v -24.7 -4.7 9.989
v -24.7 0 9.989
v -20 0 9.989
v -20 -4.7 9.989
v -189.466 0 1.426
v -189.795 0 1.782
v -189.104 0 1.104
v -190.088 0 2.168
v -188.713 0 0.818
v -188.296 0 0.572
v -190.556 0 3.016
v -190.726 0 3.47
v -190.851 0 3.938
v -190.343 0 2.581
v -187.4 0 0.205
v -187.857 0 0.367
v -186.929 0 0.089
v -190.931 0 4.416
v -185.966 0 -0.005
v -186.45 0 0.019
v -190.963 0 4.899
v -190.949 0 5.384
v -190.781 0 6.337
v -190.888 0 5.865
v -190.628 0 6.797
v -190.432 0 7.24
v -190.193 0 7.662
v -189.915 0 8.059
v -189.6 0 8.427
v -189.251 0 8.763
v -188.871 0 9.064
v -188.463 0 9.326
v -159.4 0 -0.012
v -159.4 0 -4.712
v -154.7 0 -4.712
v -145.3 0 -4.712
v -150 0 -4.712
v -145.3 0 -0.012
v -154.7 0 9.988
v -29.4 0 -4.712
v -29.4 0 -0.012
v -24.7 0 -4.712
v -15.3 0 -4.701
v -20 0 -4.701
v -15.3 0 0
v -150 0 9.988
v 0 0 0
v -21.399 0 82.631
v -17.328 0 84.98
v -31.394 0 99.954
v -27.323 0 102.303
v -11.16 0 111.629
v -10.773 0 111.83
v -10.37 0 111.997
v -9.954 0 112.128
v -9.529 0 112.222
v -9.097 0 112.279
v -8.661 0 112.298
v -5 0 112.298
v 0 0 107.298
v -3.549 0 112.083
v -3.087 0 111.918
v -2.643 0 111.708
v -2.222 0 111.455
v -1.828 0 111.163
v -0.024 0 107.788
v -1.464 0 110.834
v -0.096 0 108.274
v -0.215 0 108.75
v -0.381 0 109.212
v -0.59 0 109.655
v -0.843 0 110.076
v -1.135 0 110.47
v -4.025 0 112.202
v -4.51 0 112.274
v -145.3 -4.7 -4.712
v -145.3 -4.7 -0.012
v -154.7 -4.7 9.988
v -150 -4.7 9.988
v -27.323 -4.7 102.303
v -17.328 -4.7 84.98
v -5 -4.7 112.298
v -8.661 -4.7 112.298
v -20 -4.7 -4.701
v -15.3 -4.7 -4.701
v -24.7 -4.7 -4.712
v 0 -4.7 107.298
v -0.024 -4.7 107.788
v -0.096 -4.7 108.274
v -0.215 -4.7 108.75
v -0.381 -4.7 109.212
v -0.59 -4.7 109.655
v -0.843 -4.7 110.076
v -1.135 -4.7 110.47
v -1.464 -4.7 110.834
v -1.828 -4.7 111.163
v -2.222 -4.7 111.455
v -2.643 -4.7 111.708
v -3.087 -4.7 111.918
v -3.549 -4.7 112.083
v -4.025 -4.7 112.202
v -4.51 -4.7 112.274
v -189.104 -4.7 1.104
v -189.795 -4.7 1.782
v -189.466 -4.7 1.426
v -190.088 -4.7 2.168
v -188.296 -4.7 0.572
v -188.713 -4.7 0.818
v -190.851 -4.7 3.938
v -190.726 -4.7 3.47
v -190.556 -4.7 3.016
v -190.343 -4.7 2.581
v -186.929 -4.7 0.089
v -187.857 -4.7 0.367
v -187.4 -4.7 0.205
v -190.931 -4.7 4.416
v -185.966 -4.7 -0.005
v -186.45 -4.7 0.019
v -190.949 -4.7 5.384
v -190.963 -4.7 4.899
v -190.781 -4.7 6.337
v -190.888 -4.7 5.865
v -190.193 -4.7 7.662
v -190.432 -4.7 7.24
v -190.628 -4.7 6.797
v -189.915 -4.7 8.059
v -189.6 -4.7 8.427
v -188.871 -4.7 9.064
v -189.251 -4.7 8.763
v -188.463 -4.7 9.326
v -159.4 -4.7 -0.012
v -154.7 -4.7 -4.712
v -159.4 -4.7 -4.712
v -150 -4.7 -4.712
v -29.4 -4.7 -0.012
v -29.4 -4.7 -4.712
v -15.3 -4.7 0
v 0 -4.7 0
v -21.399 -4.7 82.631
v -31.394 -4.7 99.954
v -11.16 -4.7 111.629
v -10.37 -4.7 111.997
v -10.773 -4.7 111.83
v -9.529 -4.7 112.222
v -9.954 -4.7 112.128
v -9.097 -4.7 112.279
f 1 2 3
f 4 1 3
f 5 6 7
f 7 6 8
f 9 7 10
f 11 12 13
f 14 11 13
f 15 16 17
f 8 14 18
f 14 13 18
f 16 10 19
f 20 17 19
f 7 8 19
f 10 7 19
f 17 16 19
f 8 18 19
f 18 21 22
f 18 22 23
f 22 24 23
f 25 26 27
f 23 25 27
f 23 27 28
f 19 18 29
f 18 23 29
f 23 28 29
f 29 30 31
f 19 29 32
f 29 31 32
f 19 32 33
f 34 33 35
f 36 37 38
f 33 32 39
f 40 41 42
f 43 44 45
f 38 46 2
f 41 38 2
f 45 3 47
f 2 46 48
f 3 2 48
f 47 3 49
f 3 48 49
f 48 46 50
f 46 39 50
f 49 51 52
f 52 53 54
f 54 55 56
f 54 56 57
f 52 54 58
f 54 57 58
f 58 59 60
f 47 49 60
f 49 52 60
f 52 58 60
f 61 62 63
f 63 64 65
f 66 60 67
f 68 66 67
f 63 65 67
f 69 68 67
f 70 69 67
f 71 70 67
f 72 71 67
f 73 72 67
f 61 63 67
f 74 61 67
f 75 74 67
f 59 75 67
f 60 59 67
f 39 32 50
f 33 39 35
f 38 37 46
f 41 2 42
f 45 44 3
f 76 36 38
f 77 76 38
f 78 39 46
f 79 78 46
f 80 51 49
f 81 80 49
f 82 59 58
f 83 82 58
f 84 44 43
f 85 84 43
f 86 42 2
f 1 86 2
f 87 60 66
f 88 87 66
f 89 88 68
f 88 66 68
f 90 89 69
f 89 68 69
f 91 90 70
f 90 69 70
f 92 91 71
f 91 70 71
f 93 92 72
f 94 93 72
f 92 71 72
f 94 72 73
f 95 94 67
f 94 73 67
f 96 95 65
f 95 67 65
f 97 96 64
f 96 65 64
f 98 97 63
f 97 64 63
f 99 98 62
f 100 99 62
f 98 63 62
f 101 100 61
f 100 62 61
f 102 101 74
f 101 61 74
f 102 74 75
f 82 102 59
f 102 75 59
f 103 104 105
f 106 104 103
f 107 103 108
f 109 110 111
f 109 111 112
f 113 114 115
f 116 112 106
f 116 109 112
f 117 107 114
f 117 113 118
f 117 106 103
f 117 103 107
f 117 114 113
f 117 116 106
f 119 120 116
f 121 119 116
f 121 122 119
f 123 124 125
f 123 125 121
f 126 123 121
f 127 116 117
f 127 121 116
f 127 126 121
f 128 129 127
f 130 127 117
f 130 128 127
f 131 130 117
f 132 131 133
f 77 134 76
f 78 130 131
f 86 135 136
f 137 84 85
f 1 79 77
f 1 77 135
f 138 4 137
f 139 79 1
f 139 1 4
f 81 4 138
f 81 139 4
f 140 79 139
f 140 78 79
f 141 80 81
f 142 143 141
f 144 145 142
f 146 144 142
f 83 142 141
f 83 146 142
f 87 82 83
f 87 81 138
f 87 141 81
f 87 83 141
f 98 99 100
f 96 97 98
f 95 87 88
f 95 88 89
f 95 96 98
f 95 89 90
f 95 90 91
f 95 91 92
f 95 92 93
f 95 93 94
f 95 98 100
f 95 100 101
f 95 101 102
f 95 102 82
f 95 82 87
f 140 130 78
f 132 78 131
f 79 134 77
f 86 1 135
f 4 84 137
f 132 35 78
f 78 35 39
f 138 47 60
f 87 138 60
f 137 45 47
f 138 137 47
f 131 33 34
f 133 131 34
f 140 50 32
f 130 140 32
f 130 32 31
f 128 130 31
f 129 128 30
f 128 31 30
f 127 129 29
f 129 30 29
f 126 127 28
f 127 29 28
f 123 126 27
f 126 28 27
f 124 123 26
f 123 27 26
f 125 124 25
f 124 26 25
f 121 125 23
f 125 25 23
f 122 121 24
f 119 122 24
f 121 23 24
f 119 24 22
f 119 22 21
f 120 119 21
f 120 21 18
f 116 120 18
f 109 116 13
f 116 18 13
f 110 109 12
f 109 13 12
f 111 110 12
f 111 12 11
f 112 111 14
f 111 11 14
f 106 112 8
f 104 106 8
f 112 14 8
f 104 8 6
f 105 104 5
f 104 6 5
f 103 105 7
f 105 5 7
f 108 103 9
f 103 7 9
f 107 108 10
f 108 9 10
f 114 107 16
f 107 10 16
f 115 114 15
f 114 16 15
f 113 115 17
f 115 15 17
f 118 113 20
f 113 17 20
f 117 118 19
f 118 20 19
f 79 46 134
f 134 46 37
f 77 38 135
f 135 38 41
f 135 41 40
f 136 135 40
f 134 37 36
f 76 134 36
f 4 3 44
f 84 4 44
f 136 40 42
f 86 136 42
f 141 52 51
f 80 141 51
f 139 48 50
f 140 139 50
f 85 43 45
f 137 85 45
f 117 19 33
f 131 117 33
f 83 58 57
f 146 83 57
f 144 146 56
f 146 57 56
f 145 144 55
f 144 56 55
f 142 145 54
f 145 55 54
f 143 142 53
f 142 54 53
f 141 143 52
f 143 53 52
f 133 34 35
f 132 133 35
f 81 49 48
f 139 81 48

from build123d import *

# Parameters (mm, degrees)
F2_DEPTH = 4.7


with BuildPart() as f2:
    # F1 (on Front) → F2 (new body)
    with BuildSketch(Plane.XZ):
        with BuildLine():
            Line((-15.3, 0), (0, 0))
            Line((0, 0), (0, 107.2981178668))
            ThreePointArc((0, 107.2981178668), (-1.4644660941, 110.8336517727), (-5, 112.2981178668))
            Line((-5, 112.2981178668), (-8.6609683494, 112.2981178668))
            ThreePointArc((-8.6609683494, 112.2981178668), (-9.9544197878, 112.1279194545), (-11.1598138738, 111.6289112173))
            Line((-11.1598138738, 111.6289112173), (-27.3231734022, 102.3027357692))
            Line((-27.3231734022, 102.3027357692), (-17.3277913046, 84.979562367))
            Line((-17.3277913046, 84.979562367), (-21.3987370541, 82.630647574))
            Line((-21.3987370541, 82.630647574), (-31.3941191517, 99.9538209762))
            Line((-31.3941191517, 99.9538209762), (-188.4631123523, 9.3258184573))
            ThreePointArc((-188.4631123523, 9.3258184573), (-190.794240786, 3.7022174784), (-185.9655997989, -0.0049747155))
            Line((-185.9655997989, -0.0049747155), (-159.4, -0.0120569506))
            Line((-159.4, -0.0120569506), (-159.4, -4.7120569506))
            Line((-159.4, -4.7120569506), (-154.7, -4.7120569506))
            Line((-154.7, -4.7120569506), (-154.7, -0.0120569506))
            Line((-154.7, -0.0120569506), (-154.7, 9.9879430494))
            Line((-154.7, 9.9879430494), (-150, 9.9879430494))
            Line((-150, 9.9879430494), (-150, -0.0120569506))
            Line((-150, -0.0120569506), (-150, -4.7120569506))
            Line((-150, -4.7120569506), (-145.3, -4.7120569506))
            Line((-145.3, -4.7120569506), (-145.3, -0.0120569506))
            Line((-145.3, -0.0120569506), (-29.4, -0.0120569506))
            Line((-29.4, -0.0120569506), (-29.4, -4.7120569506))
            Line((-29.4, -4.7120569506), (-24.7, -4.7120569506))
            Line((-24.7, -4.7120569506), (-24.7, -0.0113617169))
            Line((-24.7, -0.0113617169), (-24.7, 9.9886382831))
            Line((-24.7, 9.9886382831), (-20, 9.9886382831))
            Line((-20, 9.9886382831), (-20, 0))
            Line((-20, 0), (-20, -4.7006952337))
            Line((-20, -4.7006952337), (-15.3, -4.7006952337))
            Line((-15.3, -4.7006952337), (-15.3, 0))
        make_face()
    extrude(amount=F2_DEPTH)


solid = f2.part
